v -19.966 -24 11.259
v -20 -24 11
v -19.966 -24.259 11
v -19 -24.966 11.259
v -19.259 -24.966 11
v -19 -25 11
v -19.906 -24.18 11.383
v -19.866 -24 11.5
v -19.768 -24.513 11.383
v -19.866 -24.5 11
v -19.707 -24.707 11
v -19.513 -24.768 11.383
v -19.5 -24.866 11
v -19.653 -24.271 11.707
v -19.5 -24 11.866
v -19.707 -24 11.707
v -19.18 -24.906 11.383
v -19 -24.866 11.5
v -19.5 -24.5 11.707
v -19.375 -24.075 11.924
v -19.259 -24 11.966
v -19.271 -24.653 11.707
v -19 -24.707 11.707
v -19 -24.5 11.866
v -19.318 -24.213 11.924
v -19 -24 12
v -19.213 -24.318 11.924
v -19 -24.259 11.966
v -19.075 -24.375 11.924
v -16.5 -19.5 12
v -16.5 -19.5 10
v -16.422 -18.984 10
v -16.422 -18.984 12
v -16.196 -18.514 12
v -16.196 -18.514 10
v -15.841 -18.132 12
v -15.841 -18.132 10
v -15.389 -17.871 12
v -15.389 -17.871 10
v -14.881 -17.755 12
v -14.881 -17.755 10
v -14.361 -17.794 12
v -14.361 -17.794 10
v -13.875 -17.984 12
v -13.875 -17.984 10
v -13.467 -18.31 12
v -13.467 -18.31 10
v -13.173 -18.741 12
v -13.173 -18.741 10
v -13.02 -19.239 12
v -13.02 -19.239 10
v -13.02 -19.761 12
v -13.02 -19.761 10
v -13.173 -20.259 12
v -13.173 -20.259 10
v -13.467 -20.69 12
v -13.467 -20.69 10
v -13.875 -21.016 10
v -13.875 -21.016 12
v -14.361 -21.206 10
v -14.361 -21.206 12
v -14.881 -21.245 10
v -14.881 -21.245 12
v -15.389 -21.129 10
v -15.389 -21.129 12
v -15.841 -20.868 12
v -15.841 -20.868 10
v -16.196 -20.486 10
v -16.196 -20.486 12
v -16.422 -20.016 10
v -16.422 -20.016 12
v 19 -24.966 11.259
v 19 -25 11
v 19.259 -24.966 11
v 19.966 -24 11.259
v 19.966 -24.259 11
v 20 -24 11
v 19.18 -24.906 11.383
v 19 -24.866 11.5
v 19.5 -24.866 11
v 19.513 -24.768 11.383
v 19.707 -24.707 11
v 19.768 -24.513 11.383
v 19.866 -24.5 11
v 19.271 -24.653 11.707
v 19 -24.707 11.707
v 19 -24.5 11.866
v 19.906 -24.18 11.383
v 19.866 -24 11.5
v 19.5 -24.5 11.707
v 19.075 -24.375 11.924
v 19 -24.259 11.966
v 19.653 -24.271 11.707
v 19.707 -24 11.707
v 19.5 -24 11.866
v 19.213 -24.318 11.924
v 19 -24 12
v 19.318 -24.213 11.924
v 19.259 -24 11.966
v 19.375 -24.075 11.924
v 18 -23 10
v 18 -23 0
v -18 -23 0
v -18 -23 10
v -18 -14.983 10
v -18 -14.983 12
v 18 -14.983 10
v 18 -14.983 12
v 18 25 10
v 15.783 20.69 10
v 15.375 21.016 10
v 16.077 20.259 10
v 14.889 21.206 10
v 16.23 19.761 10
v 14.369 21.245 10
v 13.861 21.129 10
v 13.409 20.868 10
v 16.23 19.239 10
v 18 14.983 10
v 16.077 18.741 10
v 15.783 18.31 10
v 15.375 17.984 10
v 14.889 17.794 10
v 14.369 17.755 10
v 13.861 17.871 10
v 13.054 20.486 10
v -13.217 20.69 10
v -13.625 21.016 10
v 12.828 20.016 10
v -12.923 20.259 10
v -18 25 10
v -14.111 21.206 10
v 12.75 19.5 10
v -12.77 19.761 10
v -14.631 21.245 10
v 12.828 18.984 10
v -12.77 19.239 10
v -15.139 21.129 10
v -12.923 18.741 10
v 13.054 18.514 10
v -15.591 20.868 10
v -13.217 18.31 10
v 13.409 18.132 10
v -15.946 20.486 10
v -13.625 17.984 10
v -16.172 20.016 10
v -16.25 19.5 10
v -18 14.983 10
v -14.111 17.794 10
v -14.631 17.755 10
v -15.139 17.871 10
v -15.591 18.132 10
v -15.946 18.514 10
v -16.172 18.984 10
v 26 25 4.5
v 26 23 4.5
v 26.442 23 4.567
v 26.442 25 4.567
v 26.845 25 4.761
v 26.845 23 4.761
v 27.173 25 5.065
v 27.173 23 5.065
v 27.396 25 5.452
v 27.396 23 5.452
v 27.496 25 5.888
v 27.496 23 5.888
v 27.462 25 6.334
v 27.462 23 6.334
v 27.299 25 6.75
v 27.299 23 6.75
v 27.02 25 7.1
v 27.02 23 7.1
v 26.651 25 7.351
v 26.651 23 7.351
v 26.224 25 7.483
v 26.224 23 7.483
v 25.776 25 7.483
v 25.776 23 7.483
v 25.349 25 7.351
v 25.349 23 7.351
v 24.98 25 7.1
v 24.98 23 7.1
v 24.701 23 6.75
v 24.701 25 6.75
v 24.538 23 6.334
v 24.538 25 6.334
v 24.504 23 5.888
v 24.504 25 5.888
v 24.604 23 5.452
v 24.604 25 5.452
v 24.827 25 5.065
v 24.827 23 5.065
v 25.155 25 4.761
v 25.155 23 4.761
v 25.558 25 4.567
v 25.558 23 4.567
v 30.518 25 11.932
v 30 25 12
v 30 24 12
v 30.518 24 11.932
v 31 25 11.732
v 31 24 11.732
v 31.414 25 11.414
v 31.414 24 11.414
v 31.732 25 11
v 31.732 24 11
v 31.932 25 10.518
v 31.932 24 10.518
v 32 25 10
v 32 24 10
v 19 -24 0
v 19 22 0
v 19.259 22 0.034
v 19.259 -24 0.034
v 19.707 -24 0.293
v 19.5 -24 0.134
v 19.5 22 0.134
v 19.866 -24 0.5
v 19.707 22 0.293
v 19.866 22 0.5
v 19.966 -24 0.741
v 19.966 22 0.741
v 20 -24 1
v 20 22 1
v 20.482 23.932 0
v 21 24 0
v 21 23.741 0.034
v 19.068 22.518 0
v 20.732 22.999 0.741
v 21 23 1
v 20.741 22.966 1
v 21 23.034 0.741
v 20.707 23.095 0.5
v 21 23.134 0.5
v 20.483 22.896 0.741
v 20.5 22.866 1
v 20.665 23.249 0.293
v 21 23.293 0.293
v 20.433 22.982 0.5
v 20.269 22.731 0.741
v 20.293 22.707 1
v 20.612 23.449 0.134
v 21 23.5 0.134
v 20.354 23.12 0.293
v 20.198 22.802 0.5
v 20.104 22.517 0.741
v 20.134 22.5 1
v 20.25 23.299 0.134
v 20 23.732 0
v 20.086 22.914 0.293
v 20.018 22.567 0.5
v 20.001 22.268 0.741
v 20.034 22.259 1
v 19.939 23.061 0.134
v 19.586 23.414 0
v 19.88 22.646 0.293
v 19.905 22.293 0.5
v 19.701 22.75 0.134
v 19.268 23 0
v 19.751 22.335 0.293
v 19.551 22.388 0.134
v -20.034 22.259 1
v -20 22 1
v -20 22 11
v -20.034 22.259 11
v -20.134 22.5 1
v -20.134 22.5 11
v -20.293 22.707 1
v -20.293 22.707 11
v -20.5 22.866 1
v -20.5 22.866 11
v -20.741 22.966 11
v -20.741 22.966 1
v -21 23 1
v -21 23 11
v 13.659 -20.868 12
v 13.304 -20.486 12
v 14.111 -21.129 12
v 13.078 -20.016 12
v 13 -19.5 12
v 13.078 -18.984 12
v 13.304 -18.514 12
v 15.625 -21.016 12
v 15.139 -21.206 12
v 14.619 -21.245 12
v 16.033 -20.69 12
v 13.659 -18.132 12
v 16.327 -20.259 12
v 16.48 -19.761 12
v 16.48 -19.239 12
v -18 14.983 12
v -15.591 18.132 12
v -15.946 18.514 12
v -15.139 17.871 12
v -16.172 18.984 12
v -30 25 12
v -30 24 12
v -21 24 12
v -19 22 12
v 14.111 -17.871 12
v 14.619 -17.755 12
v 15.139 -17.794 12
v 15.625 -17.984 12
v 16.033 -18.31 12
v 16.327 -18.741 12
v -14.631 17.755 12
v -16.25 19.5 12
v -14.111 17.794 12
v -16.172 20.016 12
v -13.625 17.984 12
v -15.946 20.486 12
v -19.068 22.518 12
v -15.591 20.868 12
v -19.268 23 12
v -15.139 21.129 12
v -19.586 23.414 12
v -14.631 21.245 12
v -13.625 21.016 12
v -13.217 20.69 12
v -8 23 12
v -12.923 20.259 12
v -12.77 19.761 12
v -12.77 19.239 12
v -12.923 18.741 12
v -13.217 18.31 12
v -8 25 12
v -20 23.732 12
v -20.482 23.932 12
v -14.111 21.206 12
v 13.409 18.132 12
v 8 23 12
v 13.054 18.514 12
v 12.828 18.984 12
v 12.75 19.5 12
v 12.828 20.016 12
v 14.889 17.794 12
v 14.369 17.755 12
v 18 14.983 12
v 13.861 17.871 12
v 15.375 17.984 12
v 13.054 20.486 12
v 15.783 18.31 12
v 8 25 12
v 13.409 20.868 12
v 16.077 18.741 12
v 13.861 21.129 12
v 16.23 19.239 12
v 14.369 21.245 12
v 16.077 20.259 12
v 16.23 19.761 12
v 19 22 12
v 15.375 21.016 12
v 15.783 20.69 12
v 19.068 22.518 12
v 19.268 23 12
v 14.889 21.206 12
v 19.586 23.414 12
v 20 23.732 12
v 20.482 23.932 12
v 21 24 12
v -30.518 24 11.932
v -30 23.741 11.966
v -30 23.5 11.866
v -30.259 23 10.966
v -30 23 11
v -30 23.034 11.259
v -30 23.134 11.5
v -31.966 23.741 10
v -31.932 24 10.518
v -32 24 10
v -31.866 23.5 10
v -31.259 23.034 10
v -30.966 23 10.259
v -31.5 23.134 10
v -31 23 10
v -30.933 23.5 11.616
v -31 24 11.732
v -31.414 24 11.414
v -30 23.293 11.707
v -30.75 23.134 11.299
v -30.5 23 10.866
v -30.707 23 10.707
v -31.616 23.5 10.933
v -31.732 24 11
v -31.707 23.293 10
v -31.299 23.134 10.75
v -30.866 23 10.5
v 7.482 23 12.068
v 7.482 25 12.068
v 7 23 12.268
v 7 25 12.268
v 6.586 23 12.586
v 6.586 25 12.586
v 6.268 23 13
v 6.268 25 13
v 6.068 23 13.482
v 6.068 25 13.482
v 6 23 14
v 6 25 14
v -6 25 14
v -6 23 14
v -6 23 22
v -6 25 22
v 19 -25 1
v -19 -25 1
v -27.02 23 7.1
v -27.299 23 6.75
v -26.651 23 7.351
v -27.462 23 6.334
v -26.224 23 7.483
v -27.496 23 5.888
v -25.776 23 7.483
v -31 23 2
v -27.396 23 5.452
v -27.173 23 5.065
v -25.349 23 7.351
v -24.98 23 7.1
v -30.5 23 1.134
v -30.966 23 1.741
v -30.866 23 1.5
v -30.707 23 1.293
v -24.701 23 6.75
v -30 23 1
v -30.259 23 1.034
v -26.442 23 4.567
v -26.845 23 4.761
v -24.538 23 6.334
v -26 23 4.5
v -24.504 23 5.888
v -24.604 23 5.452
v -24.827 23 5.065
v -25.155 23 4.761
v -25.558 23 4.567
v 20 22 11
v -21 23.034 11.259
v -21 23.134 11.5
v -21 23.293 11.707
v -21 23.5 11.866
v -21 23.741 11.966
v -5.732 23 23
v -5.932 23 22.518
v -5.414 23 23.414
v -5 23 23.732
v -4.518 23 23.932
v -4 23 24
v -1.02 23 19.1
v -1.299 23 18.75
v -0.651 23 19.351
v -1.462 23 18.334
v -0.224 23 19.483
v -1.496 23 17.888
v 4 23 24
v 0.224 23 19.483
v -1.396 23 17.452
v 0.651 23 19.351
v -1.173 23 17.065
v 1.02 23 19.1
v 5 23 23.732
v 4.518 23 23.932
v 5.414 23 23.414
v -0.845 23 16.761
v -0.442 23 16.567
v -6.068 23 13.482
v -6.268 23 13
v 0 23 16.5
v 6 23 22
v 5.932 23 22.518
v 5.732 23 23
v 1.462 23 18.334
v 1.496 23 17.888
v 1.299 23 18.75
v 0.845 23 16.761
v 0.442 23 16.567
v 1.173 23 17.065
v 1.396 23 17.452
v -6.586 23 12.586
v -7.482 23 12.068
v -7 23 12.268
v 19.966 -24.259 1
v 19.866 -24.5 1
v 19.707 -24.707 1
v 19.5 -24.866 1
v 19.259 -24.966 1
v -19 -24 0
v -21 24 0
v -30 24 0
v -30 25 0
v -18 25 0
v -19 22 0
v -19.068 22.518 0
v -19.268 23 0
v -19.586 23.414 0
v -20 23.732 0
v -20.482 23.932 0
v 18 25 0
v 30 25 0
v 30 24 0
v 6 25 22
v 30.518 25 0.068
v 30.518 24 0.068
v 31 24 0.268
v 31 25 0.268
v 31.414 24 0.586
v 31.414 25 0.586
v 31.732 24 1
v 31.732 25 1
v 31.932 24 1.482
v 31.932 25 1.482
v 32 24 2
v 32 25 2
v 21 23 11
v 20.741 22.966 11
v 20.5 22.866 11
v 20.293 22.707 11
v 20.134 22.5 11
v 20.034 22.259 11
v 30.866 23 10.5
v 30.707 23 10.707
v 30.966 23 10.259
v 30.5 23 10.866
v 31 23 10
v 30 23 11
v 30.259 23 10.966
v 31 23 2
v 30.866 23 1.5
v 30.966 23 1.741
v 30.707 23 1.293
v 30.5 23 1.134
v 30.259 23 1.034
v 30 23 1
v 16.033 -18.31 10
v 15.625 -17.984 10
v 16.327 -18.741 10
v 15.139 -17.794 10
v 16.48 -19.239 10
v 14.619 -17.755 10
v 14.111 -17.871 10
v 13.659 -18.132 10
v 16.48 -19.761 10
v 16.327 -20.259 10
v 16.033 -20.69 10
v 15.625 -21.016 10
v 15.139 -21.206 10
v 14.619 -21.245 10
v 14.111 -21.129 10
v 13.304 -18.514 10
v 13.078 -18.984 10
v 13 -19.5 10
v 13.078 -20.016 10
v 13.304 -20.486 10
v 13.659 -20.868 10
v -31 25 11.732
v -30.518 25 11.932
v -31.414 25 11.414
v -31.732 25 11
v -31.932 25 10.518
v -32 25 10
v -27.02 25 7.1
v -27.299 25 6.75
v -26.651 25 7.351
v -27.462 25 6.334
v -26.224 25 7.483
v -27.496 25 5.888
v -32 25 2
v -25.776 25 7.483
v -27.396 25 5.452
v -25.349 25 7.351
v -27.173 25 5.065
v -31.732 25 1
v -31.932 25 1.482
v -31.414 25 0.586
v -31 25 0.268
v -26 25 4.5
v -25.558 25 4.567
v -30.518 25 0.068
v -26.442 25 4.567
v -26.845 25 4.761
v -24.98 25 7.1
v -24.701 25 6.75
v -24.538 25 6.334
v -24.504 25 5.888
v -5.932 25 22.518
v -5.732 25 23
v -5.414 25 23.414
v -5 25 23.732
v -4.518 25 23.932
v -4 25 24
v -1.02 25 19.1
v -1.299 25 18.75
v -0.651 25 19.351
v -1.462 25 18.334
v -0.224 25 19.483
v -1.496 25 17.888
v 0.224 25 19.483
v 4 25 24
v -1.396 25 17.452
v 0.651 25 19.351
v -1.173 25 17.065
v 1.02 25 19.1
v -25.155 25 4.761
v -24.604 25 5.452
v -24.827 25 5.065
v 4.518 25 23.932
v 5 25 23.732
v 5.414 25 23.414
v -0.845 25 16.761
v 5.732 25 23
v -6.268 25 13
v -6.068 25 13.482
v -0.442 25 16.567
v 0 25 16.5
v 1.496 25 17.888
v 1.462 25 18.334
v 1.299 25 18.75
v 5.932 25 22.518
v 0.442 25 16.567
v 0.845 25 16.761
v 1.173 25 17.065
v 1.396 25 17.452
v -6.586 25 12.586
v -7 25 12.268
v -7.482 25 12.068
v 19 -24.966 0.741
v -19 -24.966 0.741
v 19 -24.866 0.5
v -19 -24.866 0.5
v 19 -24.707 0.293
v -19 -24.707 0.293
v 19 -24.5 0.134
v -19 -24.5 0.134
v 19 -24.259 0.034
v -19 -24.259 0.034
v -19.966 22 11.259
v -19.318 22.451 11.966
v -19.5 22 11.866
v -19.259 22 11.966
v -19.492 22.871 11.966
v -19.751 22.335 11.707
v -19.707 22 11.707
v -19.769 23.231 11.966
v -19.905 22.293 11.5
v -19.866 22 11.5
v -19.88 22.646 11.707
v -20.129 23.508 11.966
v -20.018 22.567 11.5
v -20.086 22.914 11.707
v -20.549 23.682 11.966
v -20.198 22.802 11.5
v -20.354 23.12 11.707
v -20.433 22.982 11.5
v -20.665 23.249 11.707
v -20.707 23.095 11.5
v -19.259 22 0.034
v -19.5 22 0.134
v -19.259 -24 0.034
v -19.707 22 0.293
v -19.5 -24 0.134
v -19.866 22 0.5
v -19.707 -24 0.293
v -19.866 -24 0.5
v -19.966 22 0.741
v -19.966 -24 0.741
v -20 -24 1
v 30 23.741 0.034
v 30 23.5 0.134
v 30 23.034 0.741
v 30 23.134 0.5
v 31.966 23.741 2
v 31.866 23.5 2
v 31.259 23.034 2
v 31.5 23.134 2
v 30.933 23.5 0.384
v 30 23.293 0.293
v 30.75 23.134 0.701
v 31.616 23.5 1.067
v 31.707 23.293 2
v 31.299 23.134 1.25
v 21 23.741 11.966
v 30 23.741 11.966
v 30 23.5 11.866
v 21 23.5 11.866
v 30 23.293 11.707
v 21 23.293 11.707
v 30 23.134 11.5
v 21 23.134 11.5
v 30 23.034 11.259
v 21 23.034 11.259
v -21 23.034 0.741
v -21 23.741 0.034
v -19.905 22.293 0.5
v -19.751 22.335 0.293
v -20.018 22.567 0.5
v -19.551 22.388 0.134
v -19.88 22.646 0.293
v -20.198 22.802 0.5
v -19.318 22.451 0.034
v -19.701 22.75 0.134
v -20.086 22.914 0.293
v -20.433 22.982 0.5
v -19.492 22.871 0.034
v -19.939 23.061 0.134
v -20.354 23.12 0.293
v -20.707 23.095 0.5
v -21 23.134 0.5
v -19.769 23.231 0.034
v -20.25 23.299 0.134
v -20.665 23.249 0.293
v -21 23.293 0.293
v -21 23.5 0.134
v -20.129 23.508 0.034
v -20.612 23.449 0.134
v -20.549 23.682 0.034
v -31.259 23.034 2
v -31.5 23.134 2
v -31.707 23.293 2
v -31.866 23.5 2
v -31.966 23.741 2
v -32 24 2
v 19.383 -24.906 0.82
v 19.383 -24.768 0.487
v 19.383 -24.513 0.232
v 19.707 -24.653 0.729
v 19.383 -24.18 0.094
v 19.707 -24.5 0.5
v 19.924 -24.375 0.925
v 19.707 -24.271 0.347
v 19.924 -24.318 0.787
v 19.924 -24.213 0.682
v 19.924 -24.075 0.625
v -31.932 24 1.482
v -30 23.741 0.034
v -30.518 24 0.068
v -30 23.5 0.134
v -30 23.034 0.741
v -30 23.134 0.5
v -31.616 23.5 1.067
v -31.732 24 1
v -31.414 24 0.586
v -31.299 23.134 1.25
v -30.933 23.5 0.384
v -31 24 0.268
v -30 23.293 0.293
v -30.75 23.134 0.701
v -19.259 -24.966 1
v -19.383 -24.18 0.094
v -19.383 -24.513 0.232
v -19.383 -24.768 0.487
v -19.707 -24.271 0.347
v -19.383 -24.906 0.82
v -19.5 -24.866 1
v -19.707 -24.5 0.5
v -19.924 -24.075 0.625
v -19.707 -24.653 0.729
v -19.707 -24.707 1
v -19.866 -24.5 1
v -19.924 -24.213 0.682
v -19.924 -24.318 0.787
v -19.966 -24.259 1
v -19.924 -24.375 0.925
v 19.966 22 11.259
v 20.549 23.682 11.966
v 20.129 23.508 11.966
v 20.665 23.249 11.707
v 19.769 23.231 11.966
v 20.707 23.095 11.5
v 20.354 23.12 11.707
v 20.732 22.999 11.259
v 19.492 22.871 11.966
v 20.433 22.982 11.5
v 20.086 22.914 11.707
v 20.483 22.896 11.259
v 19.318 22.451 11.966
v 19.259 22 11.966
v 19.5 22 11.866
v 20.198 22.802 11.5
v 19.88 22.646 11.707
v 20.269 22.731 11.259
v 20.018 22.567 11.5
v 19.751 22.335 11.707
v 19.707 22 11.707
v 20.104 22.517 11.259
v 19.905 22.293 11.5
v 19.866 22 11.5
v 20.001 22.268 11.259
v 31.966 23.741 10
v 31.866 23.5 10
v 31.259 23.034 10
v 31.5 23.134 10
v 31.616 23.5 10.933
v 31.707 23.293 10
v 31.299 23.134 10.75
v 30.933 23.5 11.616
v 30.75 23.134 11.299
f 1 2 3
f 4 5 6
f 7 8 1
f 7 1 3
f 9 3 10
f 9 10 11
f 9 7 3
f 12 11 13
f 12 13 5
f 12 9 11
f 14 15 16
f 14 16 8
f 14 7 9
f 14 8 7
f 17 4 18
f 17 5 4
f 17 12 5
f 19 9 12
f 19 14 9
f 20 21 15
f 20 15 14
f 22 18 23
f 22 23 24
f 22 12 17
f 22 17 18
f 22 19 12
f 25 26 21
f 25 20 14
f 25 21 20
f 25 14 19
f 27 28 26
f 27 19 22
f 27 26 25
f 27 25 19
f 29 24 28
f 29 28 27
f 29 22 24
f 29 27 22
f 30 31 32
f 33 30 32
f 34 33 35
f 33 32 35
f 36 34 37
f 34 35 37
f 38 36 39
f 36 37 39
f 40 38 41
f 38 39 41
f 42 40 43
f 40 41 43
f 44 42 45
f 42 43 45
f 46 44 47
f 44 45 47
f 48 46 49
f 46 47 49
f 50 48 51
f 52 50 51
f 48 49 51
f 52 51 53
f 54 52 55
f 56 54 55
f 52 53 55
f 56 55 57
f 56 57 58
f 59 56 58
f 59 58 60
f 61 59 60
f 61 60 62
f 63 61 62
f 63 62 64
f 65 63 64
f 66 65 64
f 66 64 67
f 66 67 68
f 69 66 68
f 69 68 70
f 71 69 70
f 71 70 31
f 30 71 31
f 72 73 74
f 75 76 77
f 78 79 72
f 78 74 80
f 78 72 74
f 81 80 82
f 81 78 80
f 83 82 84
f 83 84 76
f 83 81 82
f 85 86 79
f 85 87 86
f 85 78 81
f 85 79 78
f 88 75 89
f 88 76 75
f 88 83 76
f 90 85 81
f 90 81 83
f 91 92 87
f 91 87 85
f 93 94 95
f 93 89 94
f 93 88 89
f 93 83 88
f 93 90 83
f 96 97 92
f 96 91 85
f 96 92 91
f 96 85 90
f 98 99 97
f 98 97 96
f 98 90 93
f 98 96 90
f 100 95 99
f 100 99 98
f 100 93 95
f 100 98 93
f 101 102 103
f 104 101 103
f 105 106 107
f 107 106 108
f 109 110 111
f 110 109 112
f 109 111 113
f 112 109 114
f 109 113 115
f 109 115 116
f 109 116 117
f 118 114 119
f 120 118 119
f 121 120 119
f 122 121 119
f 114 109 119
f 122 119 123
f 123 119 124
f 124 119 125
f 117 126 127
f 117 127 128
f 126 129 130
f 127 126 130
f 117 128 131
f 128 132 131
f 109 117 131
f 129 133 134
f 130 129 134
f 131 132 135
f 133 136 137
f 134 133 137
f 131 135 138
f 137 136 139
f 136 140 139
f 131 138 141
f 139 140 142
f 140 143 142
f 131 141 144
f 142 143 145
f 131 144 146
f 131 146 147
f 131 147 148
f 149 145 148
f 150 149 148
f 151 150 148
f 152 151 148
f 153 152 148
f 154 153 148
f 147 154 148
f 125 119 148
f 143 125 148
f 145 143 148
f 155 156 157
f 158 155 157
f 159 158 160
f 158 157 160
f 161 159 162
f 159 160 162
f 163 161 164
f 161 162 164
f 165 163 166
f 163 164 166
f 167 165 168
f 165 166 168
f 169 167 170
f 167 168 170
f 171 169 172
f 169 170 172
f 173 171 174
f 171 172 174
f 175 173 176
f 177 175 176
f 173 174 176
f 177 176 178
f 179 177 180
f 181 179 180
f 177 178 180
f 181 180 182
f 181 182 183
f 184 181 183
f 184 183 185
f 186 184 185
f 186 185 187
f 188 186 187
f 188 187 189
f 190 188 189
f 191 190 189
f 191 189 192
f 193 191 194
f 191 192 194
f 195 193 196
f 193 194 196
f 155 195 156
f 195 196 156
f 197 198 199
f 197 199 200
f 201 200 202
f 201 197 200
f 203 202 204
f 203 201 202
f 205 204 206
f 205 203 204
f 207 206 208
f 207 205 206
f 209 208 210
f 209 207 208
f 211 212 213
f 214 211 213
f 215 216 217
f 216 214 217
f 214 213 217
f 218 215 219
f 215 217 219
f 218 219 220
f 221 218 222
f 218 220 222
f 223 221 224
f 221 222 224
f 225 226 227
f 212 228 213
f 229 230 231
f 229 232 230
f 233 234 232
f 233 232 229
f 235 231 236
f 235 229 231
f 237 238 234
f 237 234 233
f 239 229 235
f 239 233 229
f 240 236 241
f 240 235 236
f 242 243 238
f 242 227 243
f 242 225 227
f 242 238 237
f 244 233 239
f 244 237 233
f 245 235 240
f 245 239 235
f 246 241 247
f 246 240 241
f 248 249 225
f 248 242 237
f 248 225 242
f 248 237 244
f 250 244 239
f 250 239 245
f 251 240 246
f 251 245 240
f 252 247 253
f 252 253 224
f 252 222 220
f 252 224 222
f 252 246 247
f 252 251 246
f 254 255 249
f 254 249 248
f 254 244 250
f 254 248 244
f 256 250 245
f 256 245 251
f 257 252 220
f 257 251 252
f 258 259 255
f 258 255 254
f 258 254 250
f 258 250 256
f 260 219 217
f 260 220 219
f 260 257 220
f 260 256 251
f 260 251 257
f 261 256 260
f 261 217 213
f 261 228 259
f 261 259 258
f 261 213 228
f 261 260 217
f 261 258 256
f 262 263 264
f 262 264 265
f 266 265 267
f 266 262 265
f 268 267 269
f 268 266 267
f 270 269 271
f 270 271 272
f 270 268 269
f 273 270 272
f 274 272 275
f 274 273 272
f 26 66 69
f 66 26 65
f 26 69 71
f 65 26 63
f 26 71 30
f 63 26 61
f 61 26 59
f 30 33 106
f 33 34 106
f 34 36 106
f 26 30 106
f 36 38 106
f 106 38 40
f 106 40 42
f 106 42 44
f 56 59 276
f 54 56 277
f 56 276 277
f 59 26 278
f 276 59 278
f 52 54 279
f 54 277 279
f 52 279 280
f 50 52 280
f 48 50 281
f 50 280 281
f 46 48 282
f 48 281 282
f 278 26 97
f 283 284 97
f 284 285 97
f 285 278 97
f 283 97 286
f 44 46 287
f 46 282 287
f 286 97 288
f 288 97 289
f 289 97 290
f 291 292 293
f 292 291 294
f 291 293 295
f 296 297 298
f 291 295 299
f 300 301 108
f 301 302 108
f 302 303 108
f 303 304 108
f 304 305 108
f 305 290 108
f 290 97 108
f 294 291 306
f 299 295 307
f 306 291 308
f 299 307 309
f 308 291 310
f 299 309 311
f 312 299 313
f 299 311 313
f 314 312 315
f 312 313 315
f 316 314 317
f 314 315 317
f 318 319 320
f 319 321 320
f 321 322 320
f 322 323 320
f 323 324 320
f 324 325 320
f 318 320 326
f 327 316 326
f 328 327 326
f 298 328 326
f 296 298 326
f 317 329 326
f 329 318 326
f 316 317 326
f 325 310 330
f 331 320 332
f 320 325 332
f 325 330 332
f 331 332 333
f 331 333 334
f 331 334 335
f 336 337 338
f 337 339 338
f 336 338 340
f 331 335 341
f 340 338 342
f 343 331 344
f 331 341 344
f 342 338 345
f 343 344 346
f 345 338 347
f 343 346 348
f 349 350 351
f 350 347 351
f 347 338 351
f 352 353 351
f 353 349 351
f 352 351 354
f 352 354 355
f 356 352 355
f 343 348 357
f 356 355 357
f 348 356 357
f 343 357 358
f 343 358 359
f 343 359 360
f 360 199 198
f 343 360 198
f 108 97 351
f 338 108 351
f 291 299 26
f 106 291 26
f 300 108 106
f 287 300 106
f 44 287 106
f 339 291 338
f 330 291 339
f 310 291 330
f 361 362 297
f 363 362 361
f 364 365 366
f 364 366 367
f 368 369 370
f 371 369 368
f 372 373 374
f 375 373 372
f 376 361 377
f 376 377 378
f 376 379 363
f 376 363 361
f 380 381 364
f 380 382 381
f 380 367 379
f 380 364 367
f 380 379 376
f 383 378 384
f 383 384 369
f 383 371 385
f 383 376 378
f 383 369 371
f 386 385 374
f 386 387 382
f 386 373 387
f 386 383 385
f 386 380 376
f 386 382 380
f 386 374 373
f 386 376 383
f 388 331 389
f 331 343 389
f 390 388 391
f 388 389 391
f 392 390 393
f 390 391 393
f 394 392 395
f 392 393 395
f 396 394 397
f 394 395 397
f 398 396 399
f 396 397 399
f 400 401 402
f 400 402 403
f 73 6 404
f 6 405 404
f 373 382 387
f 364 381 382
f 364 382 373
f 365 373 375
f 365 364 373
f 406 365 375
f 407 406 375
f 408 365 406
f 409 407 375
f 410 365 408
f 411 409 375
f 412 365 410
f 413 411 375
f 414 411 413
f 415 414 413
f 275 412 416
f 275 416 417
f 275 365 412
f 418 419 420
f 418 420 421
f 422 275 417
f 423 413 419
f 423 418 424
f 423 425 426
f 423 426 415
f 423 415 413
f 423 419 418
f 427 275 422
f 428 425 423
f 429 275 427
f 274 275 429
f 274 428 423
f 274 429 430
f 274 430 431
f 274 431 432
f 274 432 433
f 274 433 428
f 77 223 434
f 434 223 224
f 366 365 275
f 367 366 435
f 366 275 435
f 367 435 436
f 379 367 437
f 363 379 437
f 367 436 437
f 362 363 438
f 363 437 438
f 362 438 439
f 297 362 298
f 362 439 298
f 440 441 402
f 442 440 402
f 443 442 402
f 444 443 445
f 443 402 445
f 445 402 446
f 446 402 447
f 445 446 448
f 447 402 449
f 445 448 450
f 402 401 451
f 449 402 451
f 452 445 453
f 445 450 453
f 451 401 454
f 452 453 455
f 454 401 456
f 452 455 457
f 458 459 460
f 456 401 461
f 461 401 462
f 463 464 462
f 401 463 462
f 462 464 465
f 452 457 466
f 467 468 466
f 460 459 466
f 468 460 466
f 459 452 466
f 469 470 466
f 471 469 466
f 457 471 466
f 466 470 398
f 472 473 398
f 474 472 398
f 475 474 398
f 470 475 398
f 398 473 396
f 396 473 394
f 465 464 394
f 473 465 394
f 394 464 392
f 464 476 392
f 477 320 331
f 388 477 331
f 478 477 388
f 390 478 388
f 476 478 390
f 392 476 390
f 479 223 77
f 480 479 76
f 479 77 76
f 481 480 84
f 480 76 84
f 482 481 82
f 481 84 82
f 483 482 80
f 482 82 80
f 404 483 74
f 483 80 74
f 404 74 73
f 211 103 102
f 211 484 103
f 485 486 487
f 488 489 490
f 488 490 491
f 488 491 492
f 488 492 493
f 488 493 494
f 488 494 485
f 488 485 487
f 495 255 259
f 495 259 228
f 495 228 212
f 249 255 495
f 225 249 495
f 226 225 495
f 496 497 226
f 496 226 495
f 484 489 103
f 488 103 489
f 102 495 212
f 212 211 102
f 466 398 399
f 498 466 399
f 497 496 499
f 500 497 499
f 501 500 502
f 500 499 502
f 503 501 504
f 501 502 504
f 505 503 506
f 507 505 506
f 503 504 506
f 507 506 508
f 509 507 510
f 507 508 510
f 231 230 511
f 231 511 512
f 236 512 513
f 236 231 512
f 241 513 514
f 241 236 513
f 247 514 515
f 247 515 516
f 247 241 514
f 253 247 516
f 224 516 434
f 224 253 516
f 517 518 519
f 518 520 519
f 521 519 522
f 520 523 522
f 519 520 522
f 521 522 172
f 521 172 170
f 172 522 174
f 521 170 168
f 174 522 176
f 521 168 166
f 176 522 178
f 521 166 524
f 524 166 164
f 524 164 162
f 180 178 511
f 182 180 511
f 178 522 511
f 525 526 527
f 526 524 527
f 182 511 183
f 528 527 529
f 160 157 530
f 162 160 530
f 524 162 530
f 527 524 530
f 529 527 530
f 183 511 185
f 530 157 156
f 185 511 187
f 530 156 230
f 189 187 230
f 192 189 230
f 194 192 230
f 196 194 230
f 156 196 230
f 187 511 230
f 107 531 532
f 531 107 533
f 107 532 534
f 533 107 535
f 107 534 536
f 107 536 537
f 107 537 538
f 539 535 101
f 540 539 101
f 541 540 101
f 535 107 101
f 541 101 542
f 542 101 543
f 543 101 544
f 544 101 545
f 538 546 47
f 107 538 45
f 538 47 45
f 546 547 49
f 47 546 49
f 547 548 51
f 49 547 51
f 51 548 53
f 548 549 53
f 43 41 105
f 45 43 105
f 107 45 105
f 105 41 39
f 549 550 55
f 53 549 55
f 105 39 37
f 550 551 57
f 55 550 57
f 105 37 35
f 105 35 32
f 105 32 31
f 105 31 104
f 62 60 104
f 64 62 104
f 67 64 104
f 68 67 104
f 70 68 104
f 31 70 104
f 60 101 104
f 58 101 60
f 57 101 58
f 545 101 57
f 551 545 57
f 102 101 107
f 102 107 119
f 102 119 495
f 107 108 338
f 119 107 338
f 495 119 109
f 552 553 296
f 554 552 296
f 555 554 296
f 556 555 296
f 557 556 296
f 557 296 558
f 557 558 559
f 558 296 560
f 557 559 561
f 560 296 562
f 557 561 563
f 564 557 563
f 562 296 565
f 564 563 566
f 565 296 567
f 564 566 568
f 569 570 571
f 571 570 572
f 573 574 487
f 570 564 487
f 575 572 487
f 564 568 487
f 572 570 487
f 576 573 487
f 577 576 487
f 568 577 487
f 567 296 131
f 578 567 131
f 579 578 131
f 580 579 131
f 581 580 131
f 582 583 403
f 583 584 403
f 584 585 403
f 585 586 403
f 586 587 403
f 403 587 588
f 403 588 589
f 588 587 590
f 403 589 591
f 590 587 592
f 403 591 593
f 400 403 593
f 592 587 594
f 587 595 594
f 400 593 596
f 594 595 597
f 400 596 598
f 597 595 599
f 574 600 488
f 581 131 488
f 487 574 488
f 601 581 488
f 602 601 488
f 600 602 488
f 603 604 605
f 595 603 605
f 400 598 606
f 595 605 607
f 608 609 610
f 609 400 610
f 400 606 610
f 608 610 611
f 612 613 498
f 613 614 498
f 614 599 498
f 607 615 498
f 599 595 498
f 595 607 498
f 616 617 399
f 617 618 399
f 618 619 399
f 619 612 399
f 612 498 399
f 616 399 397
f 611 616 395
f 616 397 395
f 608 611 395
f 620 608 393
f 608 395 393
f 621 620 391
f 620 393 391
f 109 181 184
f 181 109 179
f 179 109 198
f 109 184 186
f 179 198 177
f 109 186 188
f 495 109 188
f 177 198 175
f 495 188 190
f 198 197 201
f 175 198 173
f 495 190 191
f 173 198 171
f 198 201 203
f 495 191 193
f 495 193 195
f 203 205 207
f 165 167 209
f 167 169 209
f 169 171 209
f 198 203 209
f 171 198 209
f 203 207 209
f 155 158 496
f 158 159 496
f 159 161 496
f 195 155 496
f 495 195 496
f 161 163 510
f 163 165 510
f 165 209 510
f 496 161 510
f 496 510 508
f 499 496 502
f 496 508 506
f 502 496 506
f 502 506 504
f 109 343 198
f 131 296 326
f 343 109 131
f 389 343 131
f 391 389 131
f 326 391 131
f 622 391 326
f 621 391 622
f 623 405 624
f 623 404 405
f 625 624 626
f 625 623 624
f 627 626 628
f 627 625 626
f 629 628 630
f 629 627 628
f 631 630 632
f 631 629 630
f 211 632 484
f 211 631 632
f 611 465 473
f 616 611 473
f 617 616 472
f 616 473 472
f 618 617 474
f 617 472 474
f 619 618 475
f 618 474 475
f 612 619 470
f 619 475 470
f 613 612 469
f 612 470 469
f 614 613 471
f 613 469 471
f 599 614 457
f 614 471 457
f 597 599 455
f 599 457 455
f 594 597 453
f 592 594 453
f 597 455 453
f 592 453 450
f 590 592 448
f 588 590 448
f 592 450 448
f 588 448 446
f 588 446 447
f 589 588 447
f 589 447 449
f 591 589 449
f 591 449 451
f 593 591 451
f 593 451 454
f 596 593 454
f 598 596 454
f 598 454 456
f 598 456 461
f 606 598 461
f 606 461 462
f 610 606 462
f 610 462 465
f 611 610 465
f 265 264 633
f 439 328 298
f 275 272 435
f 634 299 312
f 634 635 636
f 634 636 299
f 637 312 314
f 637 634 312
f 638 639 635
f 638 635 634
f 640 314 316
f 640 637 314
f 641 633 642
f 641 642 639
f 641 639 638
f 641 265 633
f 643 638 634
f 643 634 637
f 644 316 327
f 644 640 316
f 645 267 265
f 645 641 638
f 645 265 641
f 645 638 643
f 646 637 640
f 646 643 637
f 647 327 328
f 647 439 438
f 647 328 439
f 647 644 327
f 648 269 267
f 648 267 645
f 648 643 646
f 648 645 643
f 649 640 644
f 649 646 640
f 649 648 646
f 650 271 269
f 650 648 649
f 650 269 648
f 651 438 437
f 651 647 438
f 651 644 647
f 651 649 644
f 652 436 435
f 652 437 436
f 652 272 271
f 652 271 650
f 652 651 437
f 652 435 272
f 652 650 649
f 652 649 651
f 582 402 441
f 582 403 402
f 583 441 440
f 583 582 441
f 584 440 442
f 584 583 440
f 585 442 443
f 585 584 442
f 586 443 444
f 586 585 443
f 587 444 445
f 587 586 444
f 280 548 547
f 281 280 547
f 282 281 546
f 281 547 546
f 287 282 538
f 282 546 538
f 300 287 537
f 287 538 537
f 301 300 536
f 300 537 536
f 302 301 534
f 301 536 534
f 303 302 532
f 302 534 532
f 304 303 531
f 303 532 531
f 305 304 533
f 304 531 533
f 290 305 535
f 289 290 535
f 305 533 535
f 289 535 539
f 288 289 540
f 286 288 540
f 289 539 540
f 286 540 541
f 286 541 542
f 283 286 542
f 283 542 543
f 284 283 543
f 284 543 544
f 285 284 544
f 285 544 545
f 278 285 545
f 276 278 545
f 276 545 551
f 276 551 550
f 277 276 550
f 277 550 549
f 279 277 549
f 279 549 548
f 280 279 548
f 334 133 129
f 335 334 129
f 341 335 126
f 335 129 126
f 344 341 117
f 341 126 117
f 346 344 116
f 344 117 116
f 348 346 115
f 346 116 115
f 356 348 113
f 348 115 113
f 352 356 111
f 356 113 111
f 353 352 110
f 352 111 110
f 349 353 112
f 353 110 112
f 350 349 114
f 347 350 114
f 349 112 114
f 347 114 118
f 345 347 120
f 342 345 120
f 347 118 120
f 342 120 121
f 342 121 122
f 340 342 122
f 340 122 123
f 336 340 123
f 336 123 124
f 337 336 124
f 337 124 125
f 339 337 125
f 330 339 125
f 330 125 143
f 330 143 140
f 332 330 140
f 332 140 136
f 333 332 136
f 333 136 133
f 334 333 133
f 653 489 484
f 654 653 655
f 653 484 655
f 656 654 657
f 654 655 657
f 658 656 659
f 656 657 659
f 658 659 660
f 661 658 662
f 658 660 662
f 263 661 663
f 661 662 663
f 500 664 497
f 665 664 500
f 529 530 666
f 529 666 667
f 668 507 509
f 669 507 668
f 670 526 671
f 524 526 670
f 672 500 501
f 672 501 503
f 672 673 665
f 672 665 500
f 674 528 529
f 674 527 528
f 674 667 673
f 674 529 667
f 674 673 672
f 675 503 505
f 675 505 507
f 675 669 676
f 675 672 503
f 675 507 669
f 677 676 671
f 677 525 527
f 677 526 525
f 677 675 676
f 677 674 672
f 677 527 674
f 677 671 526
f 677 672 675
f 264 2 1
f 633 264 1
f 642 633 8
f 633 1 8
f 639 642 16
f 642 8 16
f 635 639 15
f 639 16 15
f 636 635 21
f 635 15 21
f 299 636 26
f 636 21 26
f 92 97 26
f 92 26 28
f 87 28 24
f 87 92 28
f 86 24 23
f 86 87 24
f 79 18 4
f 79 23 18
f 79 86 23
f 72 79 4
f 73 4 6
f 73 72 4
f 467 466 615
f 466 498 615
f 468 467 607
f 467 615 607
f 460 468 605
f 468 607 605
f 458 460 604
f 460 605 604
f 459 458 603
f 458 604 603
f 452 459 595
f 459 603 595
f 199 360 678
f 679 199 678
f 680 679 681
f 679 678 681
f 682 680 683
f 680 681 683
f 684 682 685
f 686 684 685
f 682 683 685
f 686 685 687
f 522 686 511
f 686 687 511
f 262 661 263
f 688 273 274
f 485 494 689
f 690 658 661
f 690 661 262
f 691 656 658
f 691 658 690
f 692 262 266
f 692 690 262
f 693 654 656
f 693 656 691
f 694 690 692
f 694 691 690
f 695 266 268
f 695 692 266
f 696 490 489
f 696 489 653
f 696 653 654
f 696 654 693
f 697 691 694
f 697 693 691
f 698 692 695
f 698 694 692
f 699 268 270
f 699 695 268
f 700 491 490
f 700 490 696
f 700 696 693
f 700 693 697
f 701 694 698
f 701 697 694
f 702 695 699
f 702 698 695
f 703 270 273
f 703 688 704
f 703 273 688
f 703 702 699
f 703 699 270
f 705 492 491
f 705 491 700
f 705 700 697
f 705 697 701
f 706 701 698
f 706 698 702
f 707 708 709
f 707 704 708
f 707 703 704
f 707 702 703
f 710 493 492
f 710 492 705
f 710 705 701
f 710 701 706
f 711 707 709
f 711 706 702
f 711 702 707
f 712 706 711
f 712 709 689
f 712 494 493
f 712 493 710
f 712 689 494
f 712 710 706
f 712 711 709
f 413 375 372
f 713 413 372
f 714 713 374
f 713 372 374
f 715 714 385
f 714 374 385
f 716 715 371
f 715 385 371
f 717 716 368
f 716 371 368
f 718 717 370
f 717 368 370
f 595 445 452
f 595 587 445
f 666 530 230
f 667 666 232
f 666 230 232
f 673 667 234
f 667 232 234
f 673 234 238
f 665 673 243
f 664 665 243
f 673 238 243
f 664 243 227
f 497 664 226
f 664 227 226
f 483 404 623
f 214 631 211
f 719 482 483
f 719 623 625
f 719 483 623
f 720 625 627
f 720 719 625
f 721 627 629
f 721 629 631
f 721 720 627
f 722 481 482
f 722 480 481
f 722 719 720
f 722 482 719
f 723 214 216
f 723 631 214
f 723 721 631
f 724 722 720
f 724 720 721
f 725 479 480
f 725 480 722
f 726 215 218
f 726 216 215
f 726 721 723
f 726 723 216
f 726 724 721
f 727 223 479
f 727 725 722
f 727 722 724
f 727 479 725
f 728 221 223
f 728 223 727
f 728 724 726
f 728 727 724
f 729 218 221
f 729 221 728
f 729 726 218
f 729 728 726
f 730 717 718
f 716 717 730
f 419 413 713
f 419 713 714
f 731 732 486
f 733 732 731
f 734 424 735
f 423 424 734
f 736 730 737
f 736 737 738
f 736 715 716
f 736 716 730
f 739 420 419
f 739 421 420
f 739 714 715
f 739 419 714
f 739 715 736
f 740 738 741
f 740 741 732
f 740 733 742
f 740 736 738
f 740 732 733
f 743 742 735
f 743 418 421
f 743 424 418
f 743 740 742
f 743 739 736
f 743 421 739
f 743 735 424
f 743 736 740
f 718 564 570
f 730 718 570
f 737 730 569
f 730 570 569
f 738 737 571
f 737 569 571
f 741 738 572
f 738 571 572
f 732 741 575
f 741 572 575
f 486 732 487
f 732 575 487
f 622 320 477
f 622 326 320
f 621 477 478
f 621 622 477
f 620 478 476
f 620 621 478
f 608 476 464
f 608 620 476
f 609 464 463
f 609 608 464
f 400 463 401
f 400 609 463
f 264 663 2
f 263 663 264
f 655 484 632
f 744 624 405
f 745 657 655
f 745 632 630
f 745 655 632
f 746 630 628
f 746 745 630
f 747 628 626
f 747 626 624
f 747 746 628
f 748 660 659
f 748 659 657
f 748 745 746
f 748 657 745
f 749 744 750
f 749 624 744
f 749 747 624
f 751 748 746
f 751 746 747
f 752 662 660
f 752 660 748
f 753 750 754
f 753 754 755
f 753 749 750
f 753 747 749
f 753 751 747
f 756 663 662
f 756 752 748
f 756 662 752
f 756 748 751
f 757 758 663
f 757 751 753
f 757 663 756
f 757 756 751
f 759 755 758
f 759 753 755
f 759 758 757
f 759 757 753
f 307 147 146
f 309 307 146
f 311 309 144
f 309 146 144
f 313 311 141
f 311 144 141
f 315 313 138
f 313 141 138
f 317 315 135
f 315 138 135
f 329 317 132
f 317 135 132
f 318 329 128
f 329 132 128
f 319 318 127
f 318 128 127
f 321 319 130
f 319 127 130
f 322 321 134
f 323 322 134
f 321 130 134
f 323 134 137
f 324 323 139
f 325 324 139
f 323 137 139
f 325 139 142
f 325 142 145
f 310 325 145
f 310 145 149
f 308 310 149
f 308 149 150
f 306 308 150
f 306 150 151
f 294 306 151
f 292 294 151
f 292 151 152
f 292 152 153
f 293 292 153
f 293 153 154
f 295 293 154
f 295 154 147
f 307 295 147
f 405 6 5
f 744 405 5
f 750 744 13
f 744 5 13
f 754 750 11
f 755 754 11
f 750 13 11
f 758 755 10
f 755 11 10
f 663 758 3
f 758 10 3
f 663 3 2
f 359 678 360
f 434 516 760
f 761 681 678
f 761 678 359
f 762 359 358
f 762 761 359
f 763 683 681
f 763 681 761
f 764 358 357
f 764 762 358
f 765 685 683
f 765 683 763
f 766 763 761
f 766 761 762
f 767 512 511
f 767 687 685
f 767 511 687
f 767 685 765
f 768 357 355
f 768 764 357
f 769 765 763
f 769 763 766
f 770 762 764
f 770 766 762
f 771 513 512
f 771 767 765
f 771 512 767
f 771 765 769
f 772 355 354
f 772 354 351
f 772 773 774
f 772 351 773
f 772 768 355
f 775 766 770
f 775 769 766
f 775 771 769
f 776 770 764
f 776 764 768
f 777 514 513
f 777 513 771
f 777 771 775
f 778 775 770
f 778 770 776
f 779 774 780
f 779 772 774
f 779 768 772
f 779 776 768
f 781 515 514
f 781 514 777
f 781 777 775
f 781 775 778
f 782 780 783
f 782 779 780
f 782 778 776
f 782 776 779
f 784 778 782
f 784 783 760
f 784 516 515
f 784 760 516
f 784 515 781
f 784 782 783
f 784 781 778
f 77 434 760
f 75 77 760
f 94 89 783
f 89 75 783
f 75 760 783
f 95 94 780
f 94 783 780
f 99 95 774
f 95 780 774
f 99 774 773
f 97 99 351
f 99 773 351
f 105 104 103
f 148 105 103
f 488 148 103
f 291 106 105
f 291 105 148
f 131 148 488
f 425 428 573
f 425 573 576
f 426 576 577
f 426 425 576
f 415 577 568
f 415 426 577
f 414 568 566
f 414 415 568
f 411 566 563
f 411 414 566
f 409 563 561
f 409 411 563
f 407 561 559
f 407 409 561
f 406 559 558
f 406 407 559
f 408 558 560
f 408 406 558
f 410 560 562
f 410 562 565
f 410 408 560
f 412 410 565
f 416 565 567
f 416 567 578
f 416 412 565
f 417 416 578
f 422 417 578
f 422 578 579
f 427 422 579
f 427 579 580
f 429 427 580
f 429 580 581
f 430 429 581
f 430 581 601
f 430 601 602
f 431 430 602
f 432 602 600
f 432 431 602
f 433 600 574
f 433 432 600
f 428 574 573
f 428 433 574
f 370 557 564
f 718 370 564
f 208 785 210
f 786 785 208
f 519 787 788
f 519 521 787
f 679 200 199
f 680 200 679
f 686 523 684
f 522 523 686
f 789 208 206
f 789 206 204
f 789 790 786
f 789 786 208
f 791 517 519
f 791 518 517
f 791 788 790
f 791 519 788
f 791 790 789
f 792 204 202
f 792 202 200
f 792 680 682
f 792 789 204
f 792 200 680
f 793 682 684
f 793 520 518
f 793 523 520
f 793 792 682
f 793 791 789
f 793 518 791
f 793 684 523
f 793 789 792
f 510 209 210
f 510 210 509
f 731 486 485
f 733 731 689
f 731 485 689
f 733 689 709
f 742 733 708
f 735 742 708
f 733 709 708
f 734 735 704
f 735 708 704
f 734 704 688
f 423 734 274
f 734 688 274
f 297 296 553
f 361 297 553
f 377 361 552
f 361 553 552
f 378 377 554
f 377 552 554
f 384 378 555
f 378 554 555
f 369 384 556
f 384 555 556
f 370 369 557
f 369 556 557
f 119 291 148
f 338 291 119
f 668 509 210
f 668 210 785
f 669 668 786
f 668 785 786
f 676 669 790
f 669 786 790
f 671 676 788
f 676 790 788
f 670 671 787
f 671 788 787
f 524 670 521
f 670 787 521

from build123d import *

# Parameters (mm, degrees)
SKETCH_3_W           = 40
SKETCH_3_H           = 50
EXTRUDE_1_DEPTH      = 12
SKETCH_5_W           = 36
SKETCH_5_H           = 46
CUT_EXTRUDE_2_DEPTH  = 10
SKETCH_7_R           = 1.75
CUT_EXTRUDE_6_DEPTH  = 3
SKETCH_11_W          = 12
SKETCH_11_H          = 2
EXTRUDE_2_DEPTH      = 12
FILLET_1_R           = 2
SKETCH_13_R          = 1.5
CUT_EXTRUDE_7_DEPTH  = 2
FILLET_4_R           = 2
SKETCH_14_W          = 12
SKETCH_14_H          = 2
EXTRUDE_3_DEPTH      = 12
FILLET_5_R           = 2
SKETCH_15_R          = 1.5
CUT_EXTRUDE_8_DEPTH  = 12
FILLET_6_R           = 1
FILLET_7_R           = 1
SKETCH_16_W          = 36
SKETCH_16_H          = 10
CUT_EXTRUDE_9_DEPTH  = 63.481997407
SKETCH_19_W          = 36
SKETCH_19_H          = 29.966821032
CUT_EXTRUDE_10_DEPTH = 3


with BuildPart() as part:
    # 草图3 → 凸台-拉伸1 (new body)
    with BuildSketch(Plane.XY):
        Rectangle(SKETCH_3_W, SKETCH_3_H)
    extrude(amount=EXTRUDE_1_DEPTH)

    # 草图5 → 切除-拉伸2 (cut)
    with BuildSketch(Plane(origin=(0, 0, 0), x_dir=(-1, 0, 0), z_dir=(0, 0, -1))):
        Rectangle(SKETCH_5_W, SKETCH_5_H)
    extrude(amount=-CUT_EXTRUDE_2_DEPTH, mode=Mode.SUBTRACT)

    # 草图7 → 切除-拉伸6 (cut)
    with BuildSketch(Plane(origin=(0, 0, 10), x_dir=(-1, 0, 0), z_dir=(0, 0, -1))):
        with Locations((14.5, 19.5)):
            Circle(SKETCH_7_R)
        with Locations((14.75, -19.5)):
            Circle(SKETCH_7_R)
        with Locations((-14.75, -19.5)):
            Circle(SKETCH_7_R)
        with Locations((-14.5, 19.5)):
            Circle(SKETCH_7_R)
    extrude(amount=-CUT_EXTRUDE_6_DEPTH, mode=Mode.SUBTRACT)

    # 草图11 → 凸台-拉伸2 (add)
    with BuildSketch(Plane(origin=(20, 0, 0), x_dir=(0, 0, -1), z_dir=(1, 0, 0))):
        with Locations((-6, 24)):
            Rectangle(SKETCH_11_W, SKETCH_11_H)
    extrude_2 = extrude(amount=EXTRUDE_2_DEPTH)

    # 圆角1
    fillet_1_edges = [part.edges().sort_by_distance(p)[0] for p in [
        (32, 24, 0),
        (32, 24, 12),
    ]]
    fillet(fillet_1_edges, radius=FILLET_1_R)

    # 草图13 → 切除-拉伸7 (cut)
    with BuildSketch(Plane.XZ.offset(-23)):
        with Locations(Location((26, 6, 0), (0, 0, 270))):
            Circle(SKETCH_13_R)
    cut_extrude_7 = extrude(amount=-CUT_EXTRUDE_7_DEPTH, mode=Mode.SUBTRACT)

    # 镜向1: 凸台-拉伸2, 切除-拉伸7 across plane
    add(extrude_2.mirror(Plane(origin=(0, 0, 0), x_dir=(0, 0, 1), z_dir=(1, 0, 0))))
    add(cut_extrude_7.mirror(Plane(origin=(0, 0, 0), x_dir=(0, 0, 1), z_dir=(1, 0, 0))), mode=Mode.SUBTRACT)

    # 圆角4
    fillet_4_edges = [part.edges().sort_by_distance(p)[0] for p in [
        (-32, 24, 0),
        (-32, 24, 12),
    ]]
    fillet(fillet_4_edges, radius=FILLET_4_R)

    # 草图14 → 凸台-拉伸3 (add)
    with BuildSketch(Plane.XY.offset(12)):
        with Locations((0, 24)):
            Rectangle(SKETCH_14_W, SKETCH_14_H)
    extrude(amount=EXTRUDE_3_DEPTH)

    # 圆角5
    fillet_5_edges = [part.edges().sort_by_distance(p)[0] for p in [
        (6, 24, 12),
        (-6, 24, 12),
        (6, 24, 24),
        (-6, 24, 24),
    ]]
    fillet(fillet_5_edges, radius=FILLET_5_R)

    # 草图15 → 切除-拉伸8 (cut)
    with BuildSketch(Plane.XZ.offset(-23)):
        with Locations(Location((0, 18, 0), (0, 0, 270))):
            Circle(SKETCH_15_R)
    extrude(amount=-CUT_EXTRUDE_8_DEPTH, mode=Mode.SUBTRACT)

    # 圆角6
    fillet_6_edges = [part.edges().sort_by_distance(p)[0] for p in [
        (0, -25, 12),
        (0, -25, 0),
        (20, 23, 6),
        (-20, -25, 6),
        (20, -25, 6),
        (-20, 23, 6),
    ]]
    fillet(fillet_6_edges, radius=FILLET_6_R)

    # 圆角7
    # the kernel refuses this fillet: 1 mm, written as the material it takes off along each edge
    with BuildSketch(Plane(origin=(19, -24, 11), x_dir=(1, 0, 0), z_dir=(0, 0, 1))) as fillet_7_piece_1_section:
        Polygon((0, 0), (FILLET_7_R, 0), (FILLET_7_R, -FILLET_7_R), (0, -FILLET_7_R), align=None)
    fillet_7_piece_1 = extrude(amount=FILLET_7_R, mode=Mode.PRIVATE)
    fillet_7_piece_1 = fillet_7_piece_1 - Plane(origin=(19, -24, 11), x_dir=(-0.7071067811865475, 0.7071067811865475, 0), z_dir=(0, 0, 1)) * Sphere(FILLET_7_R, mode=Mode.PRIVATE)
    add(fillet_7_piece_1, mode=Mode.SUBTRACT)
    with BuildSketch(Plane(origin=(19, -24, 1), x_dir=(0, 0, -1), z_dir=(1, 0, 0))) as fillet_7_piece_2_section:
        Polygon((0, 0), (FILLET_7_R, 0), (FILLET_7_R, -FILLET_7_R), (0, -FILLET_7_R), align=None)
    fillet_7_piece_2 = extrude(amount=FILLET_7_R, mode=Mode.PRIVATE)
    fillet_7_piece_2 = fillet_7_piece_2 - Plane(origin=(19, -24, 1), x_dir=(0, 0.7071067811865475, 0.7071067811865475), z_dir=(1, 0, 0)) * Sphere(FILLET_7_R, mode=Mode.PRIVATE)
    add(fillet_7_piece_2, mode=Mode.SUBTRACT)
    with BuildSketch(Plane(origin=(-19, -24, 11), x_dir=(-1, 0, 0), z_dir=(0, 0, 1))) as fillet_7_piece_3_section:
        Polygon((0, 0), (FILLET_7_R, 0), (FILLET_7_R, FILLET_7_R), (0, FILLET_7_R), align=None)
    fillet_7_piece_3 = extrude(amount=FILLET_7_R, mode=Mode.PRIVATE)
    fillet_7_piece_3 = fillet_7_piece_3 - Plane(origin=(-19, -24, 11), x_dir=(0.7071067811865475, 0.7071067811865475, 0), z_dir=(0, 0, 1)) * Sphere(FILLET_7_R, mode=Mode.PRIVATE)
    add(fillet_7_piece_3, mode=Mode.SUBTRACT)
    with BuildSketch(Plane(origin=(-19, -24, 1), x_dir=(0, 0, -1), z_dir=(-1, 0, 0))) as fillet_7_piece_4_section:
        Polygon((0, 0), (FILLET_7_R, 0), (FILLET_7_R, FILLET_7_R), (0, FILLET_7_R), align=None)
    fillet_7_piece_4 = extrude(amount=FILLET_7_R, mode=Mode.PRIVATE)
    fillet_7_piece_4 = fillet_7_piece_4 - Plane(origin=(-19, -24, 1), x_dir=(0, 0.7071067811865475, 0.7071067811865475), z_dir=(-1, 0, 0)) * Sphere(FILLET_7_R, mode=Mode.PRIVATE)
    add(fillet_7_piece_4, mode=Mode.SUBTRACT)
    with BuildSketch(Plane(origin=(-32, 23, 10), x_dir=(1, 0, 0), z_dir=(0, 0, -1))) as fillet_7_piece_5:
        with BuildLine():
            CenterArc((FILLET_7_R, -FILLET_7_R), FILLET_7_R, 90, 90)
            Line((0, -FILLET_7_R), (0, 0))
            Line((0, 0), (FILLET_7_R, 0))
        make_face()
    extrude(amount=8, mode=Mode.SUBTRACT)
    with BuildSketch(Plane(origin=(-21, 23, 12), x_dir=(0, 1, 0), z_dir=(-1, 0, 0)), Plane(origin=(-21, 23, 0), x_dir=(0, 0, 1), z_dir=(-1, 0, 0))) as fillet_7_piece_6:
        with BuildLine():
            CenterArc((FILLET_7_R, FILLET_7_R), FILLET_7_R, 180, 90)
            Line((0, FILLET_7_R), (0, 0))
            Line((0, 0), (FILLET_7_R, 0))
        make_face()
    extrude(amount=9, mode=Mode.SUBTRACT)
    with BuildSketch(Plane(origin=(-30, 23, 10), x_dir=(0, 0, 1), z_dir=(1, 0, 0))) as fillet_7_piece_7:
        with BuildLine():
            CenterArc((2 - FILLET_7_R, -FILLET_7_R), FILLET_7_R, 0, 90)
            Line((2, -FILLET_7_R), (2, 0))
            Line((2, 0), (2 - FILLET_7_R, 0))
        make_face()
    revolve(axis=Axis((-30, 23, 10), (0, -1, 0)), revolution_arc=90, mode=Mode.SUBTRACT)
    with BuildSketch(Plane(origin=(-30, 23, 2), x_dir=(-1, 0, 0), z_dir=(0, 0, 1))) as fillet_7_piece_8:
        with BuildLine():
            CenterArc((2 - FILLET_7_R, -FILLET_7_R), FILLET_7_R, 0, 90)
            Line((2, -FILLET_7_R), (2, 0))
            Line((2, 0), (2 - FILLET_7_R, 0))
        make_face()
    revolve(axis=Axis((-30, 23, 2), (0, -1, 0)), revolution_arc=90, mode=Mode.SUBTRACT)
    with BuildSketch(Plane(origin=(-20, -24, 12), x_dir=(1, 0, 0), z_dir=(0, 1, 0)), Plane(origin=(-20, -24, 0), x_dir=(0, 0, 1), z_dir=(0, 1, 0)), Plane(origin=(20, 22, 12), x_dir=(-1, 0, 0), z_dir=(0, -1, 0)), Plane(origin=(20, 22, 0), x_dir=(0, 0, 1), z_dir=(0, -1, 0))) as fillet_7_piece_9:
        with BuildLine():
            CenterArc((FILLET_7_R, FILLET_7_R), FILLET_7_R, 180, 90)
            Line((0, FILLET_7_R), (0, 0))
            Line((0, 0), (FILLET_7_R, 0))
        make_face()
    extrude(amount=46, mode=Mode.SUBTRACT)
    with BuildSketch(Plane(origin=(-21, 22, 0), x_dir=(1, 0, 0), z_dir=(0, -1, 0))) as fillet_7_piece_10:
        with BuildLine():
            CenterArc((1 + FILLET_7_R, FILLET_7_R), FILLET_7_R, 180, 90)
            Line((1 + FILLET_7_R, 0), (1, 0))
            Line((1, 0), (1, FILLET_7_R))
        make_face()
    revolve(axis=Axis((-21, 22, 0), (0, 0, 1)), revolution_arc=90, mode=Mode.SUBTRACT)
    with BuildSketch(Plane(origin=(-21, 22, 12), x_dir=(1, 0, 0), z_dir=(0, -1, 0))) as fillet_7_piece_11:
        with BuildLine():
            CenterArc((1 + FILLET_7_R, -FILLET_7_R), FILLET_7_R, 90, 90)
            Line((1, -FILLET_7_R), (1, 0))
            Line((1, 0), (1 + FILLET_7_R, 0))
        make_face()
    revolve(axis=Axis((-21, 22, 12), (0, 0, 1)), revolution_arc=90, mode=Mode.SUBTRACT)
    with BuildSketch(Plane(origin=(21, 22, 0), x_dir=(0, 1, 0), z_dir=(1, 0, 0))) as fillet_7_piece_12:
        with BuildLine():
            CenterArc((1 + FILLET_7_R, FILLET_7_R), FILLET_7_R, 180, 90)
            Line((1 + FILLET_7_R, 0), (1, 0))
            Line((1, 0), (1, FILLET_7_R))
        make_face()
    revolve(axis=Axis((21, 22, 0), (0, 0, 1)), revolution_arc=90, mode=Mode.SUBTRACT)
    with BuildSketch(Plane(origin=(21, 22, 12), x_dir=(0, 1, 0), z_dir=(1, 0, 0))) as fillet_7_piece_13:
        with BuildLine():
            CenterArc((1 + FILLET_7_R, -FILLET_7_R), FILLET_7_R, 90, 90)
            Line((1, -FILLET_7_R), (1, 0))
            Line((1, 0), (1 + FILLET_7_R, 0))
        make_face()
    revolve(axis=Axis((21, 22, 12), (0, 0, 1)), revolution_arc=90, mode=Mode.SUBTRACT)
    with BuildSketch(Plane(origin=(32, 23, 10), x_dir=(-1, 0, 0), z_dir=(0, 0, -1))) as fillet_7_piece_14:
        with BuildLine():
            CenterArc((FILLET_7_R, FILLET_7_R), FILLET_7_R, 180, 90)
            Line((0, FILLET_7_R), (0, 0))
            Line((0, 0), (FILLET_7_R, 0))
        make_face()
    extrude(amount=8, mode=Mode.SUBTRACT)
    with BuildSketch(Plane(origin=(21, 23, 0), x_dir=(0, 0, 1), z_dir=(1, 0, 0)), Plane(origin=(21, 23, 12), x_dir=(0, 1, 0), z_dir=(1, 0, 0))) as fillet_7_piece_15:
        with BuildLine():
            CenterArc((FILLET_7_R, -FILLET_7_R), FILLET_7_R, 90, 90)
            Line((0, -FILLET_7_R), (0, 0))
            Line((0, 0), (FILLET_7_R, 0))
        make_face()
    extrude(amount=9, mode=Mode.SUBTRACT)
    with BuildSketch(Plane(origin=(30, 23, 2), x_dir=(0, 0, -1), z_dir=(-1, 0, 0))) as fillet_7_piece_16:
        with BuildLine():
            CenterArc((2 - FILLET_7_R, -FILLET_7_R), FILLET_7_R, 0, 90)
            Line((2, -FILLET_7_R), (2, 0))
            Line((2, 0), (2 - FILLET_7_R, 0))
        make_face()
    revolve(axis=Axis((30, 23, 2), (0, -1, 0)), revolution_arc=90, mode=Mode.SUBTRACT)
    with BuildSketch(Plane(origin=(30, 23, 10), x_dir=(1, 0, 0), z_dir=(0, 0, -1))) as fillet_7_piece_17:
        with BuildLine():
            CenterArc((2 - FILLET_7_R, -FILLET_7_R), FILLET_7_R, 0, 90)
            Line((2, -FILLET_7_R), (2, 0))
            Line((2, 0), (2 - FILLET_7_R, 0))
        make_face()
    revolve(axis=Axis((30, 23, 10), (0, -1, 0)), revolution_arc=90, mode=Mode.SUBTRACT)

    # 草图16 → 切除-拉伸9 (cut, through all)
    with BuildSketch(Plane(origin=(0, 23, 0), x_dir=(-1, 0, 0), z_dir=(0, -1, 0))):
        with Locations((0, -5)):
            Rectangle(SKETCH_16_W, SKETCH_16_H)
    extrude(amount=-CUT_EXTRUDE_9_DEPTH, mode=Mode.SUBTRACT)

    # 草图19 → 切除-拉伸10 (cut)
    with BuildSketch(Plane.XY.offset(12)):
        Rectangle(SKETCH_19_W, SKETCH_19_H)
    extrude(amount=-CUT_EXTRUDE_10_DEPTH, mode=Mode.SUBTRACT)


solid = part.part
